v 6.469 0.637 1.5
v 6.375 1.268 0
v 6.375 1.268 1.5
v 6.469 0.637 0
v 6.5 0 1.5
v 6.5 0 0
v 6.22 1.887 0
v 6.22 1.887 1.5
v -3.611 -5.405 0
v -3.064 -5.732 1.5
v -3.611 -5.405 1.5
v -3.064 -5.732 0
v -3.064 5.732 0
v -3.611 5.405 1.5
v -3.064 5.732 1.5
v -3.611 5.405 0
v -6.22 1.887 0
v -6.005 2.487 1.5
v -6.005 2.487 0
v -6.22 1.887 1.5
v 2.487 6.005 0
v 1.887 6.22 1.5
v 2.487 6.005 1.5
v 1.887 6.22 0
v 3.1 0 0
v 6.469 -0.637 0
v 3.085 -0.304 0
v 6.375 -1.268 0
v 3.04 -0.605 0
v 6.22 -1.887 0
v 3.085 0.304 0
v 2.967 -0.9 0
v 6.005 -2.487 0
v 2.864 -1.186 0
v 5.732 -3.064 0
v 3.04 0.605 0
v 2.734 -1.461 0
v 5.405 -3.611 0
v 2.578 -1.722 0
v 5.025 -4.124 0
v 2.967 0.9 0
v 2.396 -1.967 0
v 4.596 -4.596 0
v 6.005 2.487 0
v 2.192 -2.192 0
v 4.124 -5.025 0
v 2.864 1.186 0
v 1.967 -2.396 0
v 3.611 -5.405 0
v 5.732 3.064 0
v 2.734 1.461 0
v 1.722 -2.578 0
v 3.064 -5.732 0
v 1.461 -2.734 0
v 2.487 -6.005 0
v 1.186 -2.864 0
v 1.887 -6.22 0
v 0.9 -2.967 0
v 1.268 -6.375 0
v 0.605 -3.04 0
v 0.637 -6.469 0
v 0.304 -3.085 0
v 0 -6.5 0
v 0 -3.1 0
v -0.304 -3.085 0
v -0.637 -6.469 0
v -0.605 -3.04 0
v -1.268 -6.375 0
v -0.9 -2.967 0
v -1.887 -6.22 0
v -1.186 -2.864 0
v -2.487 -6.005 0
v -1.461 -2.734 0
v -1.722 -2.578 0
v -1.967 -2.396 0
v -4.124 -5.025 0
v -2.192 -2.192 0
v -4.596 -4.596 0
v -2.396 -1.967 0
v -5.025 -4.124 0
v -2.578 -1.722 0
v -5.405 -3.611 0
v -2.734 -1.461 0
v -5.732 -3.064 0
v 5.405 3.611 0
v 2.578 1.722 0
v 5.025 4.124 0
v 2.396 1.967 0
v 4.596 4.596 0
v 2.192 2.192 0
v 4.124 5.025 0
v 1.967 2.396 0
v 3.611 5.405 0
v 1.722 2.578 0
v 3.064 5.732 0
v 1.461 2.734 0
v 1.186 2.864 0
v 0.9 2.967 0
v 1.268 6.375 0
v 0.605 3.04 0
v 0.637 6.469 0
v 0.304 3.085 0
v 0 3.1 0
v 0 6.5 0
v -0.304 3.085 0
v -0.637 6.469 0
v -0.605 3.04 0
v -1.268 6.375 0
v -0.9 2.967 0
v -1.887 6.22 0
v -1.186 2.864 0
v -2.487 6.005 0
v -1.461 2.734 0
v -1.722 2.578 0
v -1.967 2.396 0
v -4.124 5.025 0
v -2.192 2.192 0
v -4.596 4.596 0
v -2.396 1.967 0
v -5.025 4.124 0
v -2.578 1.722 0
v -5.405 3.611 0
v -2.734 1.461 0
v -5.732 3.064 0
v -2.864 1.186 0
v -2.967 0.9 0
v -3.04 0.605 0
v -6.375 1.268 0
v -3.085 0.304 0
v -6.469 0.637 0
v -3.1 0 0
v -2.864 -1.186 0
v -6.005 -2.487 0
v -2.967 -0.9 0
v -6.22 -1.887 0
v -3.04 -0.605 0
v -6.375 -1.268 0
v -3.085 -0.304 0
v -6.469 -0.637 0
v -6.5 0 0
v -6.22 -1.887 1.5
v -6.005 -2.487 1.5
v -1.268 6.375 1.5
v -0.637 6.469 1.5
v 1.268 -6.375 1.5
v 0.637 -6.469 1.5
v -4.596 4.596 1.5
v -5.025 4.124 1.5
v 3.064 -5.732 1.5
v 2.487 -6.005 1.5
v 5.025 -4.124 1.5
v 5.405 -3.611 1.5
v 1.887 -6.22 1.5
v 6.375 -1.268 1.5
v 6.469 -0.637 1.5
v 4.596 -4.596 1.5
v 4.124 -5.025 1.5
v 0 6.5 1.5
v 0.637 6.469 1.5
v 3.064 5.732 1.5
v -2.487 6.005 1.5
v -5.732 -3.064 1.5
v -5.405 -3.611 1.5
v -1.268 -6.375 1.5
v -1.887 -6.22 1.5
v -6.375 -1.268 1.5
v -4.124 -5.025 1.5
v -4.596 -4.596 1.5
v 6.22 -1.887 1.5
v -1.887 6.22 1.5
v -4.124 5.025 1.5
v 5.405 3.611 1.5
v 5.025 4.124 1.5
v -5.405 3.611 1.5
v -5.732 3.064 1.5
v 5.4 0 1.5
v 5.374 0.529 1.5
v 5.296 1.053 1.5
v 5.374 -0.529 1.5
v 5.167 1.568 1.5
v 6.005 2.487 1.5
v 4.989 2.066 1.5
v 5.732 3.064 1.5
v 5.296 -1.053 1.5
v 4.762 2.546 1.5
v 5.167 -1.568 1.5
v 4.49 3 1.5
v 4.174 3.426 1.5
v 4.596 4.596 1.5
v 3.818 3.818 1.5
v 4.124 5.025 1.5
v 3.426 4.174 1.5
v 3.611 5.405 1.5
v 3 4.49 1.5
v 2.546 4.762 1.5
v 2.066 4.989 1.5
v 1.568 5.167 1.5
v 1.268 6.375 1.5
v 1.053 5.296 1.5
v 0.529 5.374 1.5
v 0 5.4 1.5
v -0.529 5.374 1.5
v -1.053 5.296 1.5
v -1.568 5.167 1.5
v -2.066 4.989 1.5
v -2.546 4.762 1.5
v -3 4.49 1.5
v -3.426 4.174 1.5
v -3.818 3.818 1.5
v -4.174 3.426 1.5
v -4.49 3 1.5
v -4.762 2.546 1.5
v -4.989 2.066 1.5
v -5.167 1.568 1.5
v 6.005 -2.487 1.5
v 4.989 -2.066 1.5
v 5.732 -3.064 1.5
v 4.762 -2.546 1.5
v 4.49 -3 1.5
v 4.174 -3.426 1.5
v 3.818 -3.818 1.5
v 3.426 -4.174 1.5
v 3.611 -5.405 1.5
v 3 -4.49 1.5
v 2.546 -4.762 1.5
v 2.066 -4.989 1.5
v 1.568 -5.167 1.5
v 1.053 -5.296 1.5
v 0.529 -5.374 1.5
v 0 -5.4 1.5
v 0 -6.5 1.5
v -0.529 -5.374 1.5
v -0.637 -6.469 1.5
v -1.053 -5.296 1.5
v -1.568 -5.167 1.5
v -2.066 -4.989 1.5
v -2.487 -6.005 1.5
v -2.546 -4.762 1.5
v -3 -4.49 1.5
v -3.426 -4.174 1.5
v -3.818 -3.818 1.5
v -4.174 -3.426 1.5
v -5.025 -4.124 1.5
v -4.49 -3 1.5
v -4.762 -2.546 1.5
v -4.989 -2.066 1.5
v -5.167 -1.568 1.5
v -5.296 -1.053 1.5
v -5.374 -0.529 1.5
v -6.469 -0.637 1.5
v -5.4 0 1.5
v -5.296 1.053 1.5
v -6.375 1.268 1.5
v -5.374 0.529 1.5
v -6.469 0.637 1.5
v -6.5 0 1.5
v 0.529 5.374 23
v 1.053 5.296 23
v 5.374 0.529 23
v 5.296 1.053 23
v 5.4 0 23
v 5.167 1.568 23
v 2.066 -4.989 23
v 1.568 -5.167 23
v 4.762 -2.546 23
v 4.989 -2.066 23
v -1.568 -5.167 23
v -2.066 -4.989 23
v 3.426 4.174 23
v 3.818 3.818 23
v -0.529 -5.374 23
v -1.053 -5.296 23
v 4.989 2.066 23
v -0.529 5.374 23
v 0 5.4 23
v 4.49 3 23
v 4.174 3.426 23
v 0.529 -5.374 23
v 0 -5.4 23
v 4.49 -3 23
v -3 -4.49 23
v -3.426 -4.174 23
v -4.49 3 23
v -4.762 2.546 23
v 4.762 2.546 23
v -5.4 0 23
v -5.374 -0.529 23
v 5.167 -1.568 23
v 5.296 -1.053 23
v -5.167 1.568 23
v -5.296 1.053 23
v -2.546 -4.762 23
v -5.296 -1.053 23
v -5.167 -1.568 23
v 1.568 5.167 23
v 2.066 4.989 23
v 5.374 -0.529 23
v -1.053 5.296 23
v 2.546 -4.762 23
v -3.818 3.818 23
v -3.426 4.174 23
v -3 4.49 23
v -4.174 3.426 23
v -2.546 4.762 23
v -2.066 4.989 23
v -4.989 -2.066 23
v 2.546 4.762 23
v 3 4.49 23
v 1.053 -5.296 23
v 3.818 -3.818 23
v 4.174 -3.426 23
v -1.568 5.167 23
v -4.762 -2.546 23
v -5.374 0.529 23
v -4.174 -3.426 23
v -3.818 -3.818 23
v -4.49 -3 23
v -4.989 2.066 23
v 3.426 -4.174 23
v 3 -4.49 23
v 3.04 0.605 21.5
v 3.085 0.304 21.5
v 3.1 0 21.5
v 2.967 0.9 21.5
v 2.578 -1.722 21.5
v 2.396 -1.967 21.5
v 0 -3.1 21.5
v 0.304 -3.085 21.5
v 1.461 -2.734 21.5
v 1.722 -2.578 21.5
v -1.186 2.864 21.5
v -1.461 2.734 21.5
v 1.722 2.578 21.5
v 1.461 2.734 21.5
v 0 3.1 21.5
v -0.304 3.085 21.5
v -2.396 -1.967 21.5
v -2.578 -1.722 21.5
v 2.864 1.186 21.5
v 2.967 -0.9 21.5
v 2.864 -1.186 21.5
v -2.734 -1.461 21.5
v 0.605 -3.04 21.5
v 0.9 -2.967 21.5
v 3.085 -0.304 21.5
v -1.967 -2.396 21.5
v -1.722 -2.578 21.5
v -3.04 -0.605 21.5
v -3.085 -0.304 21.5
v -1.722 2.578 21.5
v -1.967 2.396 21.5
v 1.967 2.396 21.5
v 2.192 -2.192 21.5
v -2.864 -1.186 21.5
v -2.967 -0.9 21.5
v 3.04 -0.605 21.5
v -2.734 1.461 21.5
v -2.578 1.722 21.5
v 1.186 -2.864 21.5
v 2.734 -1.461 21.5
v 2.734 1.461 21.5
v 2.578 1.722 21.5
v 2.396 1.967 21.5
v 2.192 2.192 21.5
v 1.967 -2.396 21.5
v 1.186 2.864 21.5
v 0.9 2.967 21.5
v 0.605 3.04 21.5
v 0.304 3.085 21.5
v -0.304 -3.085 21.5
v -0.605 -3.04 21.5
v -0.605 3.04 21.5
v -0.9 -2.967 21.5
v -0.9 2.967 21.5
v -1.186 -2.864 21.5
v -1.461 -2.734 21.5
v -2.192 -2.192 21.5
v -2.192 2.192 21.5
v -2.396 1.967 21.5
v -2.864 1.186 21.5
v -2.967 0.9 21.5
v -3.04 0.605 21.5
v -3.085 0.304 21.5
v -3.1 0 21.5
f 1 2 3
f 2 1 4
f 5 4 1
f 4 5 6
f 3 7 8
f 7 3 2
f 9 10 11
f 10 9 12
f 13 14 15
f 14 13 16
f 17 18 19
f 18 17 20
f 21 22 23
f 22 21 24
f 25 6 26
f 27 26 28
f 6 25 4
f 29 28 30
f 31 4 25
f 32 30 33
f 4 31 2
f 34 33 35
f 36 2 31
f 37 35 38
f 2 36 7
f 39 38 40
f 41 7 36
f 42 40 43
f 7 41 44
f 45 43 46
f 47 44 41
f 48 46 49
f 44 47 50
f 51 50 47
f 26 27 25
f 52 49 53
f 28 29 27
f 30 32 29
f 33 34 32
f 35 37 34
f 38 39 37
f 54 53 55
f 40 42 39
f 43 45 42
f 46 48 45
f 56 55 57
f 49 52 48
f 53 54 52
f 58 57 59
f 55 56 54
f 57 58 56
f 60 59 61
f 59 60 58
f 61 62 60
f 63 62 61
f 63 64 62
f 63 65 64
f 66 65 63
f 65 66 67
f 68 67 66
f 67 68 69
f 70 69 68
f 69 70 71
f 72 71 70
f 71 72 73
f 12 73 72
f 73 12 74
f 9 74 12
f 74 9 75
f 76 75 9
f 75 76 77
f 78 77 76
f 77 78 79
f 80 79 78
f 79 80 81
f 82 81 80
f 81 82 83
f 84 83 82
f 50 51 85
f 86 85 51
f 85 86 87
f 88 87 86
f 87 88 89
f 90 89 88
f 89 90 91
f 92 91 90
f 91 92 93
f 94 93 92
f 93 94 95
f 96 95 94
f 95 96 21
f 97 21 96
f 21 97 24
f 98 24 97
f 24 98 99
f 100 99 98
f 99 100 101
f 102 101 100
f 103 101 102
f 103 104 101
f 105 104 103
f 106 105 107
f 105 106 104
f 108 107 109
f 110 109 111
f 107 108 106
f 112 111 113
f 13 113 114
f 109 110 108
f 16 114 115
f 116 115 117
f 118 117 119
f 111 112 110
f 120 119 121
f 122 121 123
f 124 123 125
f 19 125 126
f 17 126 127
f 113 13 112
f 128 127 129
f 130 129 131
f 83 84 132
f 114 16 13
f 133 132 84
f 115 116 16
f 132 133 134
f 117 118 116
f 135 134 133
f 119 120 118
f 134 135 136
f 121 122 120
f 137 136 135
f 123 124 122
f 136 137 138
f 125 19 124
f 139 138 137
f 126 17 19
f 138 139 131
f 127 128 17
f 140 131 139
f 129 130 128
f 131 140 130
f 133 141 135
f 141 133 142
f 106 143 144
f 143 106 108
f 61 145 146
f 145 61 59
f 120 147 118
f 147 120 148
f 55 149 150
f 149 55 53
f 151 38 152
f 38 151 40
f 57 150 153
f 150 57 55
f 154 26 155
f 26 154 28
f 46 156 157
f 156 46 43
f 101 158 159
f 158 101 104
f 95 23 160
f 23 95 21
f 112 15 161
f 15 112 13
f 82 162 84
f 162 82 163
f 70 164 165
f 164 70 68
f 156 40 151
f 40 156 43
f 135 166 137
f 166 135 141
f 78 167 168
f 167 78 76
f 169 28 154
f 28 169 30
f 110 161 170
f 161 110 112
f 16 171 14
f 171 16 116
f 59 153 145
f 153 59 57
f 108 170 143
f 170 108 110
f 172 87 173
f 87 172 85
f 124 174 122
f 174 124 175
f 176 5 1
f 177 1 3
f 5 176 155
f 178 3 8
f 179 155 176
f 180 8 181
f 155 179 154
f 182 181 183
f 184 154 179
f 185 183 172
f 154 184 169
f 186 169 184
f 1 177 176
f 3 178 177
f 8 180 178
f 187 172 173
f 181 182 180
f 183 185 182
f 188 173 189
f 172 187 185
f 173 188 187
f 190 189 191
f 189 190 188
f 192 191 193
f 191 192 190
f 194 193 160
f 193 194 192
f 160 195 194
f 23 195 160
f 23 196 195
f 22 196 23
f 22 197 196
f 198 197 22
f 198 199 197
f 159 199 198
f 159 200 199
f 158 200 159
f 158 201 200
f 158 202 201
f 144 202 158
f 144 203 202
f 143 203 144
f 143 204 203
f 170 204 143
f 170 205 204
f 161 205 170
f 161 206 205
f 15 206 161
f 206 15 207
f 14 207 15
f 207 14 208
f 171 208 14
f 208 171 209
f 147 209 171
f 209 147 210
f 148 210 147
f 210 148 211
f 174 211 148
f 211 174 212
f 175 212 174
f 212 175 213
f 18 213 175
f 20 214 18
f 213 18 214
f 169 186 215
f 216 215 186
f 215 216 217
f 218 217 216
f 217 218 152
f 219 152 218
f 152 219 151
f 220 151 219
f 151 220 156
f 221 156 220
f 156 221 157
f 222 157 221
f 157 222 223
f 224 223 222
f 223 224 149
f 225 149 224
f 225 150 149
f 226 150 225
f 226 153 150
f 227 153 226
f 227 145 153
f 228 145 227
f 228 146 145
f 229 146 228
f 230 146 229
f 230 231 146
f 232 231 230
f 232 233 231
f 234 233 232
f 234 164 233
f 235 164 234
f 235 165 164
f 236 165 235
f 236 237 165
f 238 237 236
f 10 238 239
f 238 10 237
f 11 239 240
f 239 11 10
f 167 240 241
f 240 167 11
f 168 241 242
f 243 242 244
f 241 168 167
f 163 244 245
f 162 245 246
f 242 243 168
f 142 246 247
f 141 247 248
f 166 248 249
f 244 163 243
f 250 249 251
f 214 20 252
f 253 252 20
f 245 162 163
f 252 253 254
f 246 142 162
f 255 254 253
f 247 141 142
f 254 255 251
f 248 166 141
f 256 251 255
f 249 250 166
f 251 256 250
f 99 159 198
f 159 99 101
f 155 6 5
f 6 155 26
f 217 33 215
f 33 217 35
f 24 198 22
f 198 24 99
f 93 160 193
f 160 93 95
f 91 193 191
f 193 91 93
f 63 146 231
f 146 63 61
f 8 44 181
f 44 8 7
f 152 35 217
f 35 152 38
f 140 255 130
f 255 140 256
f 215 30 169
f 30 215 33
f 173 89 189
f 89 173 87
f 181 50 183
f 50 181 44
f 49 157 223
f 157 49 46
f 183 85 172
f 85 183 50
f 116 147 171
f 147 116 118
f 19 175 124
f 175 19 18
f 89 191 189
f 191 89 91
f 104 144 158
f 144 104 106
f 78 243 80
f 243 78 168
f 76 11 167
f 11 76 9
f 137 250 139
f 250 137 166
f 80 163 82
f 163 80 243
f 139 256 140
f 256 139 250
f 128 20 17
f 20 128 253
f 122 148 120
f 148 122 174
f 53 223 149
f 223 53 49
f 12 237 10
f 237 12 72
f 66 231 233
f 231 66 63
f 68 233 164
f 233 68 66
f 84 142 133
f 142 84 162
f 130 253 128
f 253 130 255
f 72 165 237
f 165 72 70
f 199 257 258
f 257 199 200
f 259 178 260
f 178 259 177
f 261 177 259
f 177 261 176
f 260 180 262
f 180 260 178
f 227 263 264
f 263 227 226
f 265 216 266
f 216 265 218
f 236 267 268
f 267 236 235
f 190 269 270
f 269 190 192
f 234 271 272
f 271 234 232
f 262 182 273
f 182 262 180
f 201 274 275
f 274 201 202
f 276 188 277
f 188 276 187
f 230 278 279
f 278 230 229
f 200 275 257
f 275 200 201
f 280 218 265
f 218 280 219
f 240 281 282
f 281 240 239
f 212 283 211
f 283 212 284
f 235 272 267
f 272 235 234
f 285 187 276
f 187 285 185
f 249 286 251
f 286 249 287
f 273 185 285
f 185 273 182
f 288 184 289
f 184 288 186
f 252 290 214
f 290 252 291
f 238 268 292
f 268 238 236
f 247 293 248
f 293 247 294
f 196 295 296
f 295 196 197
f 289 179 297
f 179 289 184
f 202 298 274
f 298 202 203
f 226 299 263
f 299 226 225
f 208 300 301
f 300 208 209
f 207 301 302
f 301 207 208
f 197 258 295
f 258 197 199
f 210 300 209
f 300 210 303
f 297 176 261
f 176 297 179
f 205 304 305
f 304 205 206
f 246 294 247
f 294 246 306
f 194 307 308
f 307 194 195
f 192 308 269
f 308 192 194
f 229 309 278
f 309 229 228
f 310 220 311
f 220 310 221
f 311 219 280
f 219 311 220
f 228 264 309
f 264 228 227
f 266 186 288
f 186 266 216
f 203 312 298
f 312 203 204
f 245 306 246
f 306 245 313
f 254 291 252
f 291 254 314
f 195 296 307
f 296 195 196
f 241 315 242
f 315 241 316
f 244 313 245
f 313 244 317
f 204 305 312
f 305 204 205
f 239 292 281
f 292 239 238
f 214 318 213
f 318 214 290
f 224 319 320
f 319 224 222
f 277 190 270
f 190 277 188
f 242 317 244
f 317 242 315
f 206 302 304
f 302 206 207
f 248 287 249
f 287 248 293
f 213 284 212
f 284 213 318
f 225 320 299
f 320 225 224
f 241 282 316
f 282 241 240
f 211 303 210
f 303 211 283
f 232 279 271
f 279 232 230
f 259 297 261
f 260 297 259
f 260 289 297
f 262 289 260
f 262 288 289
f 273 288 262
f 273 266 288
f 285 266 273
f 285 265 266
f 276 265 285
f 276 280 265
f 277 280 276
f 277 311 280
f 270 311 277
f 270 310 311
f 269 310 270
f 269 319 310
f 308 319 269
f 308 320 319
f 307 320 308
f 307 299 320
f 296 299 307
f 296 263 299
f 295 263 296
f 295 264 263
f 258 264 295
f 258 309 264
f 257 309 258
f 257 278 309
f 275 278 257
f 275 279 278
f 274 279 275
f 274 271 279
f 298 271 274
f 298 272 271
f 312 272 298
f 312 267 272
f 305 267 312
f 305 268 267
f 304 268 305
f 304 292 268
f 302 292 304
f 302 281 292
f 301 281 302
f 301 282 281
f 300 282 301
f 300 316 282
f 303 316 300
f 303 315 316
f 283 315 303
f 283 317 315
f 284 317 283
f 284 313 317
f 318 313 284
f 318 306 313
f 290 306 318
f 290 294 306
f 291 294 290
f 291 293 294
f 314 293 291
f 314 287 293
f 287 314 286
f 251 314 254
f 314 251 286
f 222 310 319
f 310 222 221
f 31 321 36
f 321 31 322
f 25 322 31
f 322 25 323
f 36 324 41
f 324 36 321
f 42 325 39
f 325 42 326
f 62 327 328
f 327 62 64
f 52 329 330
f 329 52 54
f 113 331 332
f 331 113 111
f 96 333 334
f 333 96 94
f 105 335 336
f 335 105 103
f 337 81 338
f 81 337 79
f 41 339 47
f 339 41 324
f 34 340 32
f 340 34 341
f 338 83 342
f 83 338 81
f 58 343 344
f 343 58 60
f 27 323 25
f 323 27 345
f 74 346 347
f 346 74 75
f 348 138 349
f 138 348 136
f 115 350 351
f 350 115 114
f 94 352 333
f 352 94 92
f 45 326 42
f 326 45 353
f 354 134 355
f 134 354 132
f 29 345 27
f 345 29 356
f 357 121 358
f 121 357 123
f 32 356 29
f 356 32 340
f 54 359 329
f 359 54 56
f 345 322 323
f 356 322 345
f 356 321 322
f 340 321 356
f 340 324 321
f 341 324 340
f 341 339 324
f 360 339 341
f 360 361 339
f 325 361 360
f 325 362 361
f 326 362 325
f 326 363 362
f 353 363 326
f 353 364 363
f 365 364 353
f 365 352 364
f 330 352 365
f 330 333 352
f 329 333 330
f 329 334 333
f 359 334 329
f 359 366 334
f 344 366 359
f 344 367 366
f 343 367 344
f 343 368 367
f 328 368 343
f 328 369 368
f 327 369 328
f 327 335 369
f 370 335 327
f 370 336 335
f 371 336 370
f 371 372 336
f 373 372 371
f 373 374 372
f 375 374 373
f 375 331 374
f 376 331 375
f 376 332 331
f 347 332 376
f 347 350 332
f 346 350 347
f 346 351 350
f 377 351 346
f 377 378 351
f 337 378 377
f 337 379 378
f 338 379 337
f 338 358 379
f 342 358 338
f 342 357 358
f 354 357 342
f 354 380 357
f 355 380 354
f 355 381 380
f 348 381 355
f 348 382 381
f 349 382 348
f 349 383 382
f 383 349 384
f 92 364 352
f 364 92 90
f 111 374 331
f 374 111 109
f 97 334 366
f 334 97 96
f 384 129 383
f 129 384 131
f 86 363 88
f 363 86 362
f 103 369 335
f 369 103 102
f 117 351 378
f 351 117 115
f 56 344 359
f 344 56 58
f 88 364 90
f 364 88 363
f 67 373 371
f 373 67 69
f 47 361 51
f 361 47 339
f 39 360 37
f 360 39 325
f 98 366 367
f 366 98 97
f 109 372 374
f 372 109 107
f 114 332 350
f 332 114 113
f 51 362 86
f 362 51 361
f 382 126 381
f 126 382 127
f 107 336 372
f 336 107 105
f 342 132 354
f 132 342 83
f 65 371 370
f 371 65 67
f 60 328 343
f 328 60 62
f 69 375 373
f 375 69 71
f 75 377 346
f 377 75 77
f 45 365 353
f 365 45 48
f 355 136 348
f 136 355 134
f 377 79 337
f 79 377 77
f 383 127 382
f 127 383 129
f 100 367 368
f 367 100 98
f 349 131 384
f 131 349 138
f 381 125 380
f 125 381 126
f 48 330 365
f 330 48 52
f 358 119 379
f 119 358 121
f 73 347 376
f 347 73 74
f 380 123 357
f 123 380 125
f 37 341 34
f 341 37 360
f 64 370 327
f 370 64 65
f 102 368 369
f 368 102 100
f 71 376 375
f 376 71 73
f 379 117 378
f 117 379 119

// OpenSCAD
// Adapter sleeve: 0.2 mL PCR tube for a 1.5 mL tube rack hole
// Print orientation: collar on the bed (z = 0), sleeve body builds upward.

$fn = 64;

// ---- Dimensions (mm) ----
collar_d      = 13;    // collar outer diameter
collar_h      = 1.5;   // collar thickness (z = 0 to 1.5)
sleeve_od     = 10.8;  // sleeve body outer diameter
sleeve_top_z  = 21.5;  // top of sleeve body (z)
bore_d        = 6.2;   // through-bore diameter
eps           = 0.5;   // cutter overshoot past faces

total_h = sleeve_top_z + eps;  // full height for the through-bore

// ---- Model ----
difference() {
    union() {
        // Collar
        cylinder(d = collar_d, h = collar_h);
        // Sleeve body (slightly overlaps collar for a clean union)
        translate([0, 0, collar_h - 0.01])
            cylinder(d = sleeve_od, h = sleeve_top_z + 0.01);
    }
    // Straight through-bore
    translate([0, 0, -eps])
        cylinder(d = bore_d, h = total_h);
}
